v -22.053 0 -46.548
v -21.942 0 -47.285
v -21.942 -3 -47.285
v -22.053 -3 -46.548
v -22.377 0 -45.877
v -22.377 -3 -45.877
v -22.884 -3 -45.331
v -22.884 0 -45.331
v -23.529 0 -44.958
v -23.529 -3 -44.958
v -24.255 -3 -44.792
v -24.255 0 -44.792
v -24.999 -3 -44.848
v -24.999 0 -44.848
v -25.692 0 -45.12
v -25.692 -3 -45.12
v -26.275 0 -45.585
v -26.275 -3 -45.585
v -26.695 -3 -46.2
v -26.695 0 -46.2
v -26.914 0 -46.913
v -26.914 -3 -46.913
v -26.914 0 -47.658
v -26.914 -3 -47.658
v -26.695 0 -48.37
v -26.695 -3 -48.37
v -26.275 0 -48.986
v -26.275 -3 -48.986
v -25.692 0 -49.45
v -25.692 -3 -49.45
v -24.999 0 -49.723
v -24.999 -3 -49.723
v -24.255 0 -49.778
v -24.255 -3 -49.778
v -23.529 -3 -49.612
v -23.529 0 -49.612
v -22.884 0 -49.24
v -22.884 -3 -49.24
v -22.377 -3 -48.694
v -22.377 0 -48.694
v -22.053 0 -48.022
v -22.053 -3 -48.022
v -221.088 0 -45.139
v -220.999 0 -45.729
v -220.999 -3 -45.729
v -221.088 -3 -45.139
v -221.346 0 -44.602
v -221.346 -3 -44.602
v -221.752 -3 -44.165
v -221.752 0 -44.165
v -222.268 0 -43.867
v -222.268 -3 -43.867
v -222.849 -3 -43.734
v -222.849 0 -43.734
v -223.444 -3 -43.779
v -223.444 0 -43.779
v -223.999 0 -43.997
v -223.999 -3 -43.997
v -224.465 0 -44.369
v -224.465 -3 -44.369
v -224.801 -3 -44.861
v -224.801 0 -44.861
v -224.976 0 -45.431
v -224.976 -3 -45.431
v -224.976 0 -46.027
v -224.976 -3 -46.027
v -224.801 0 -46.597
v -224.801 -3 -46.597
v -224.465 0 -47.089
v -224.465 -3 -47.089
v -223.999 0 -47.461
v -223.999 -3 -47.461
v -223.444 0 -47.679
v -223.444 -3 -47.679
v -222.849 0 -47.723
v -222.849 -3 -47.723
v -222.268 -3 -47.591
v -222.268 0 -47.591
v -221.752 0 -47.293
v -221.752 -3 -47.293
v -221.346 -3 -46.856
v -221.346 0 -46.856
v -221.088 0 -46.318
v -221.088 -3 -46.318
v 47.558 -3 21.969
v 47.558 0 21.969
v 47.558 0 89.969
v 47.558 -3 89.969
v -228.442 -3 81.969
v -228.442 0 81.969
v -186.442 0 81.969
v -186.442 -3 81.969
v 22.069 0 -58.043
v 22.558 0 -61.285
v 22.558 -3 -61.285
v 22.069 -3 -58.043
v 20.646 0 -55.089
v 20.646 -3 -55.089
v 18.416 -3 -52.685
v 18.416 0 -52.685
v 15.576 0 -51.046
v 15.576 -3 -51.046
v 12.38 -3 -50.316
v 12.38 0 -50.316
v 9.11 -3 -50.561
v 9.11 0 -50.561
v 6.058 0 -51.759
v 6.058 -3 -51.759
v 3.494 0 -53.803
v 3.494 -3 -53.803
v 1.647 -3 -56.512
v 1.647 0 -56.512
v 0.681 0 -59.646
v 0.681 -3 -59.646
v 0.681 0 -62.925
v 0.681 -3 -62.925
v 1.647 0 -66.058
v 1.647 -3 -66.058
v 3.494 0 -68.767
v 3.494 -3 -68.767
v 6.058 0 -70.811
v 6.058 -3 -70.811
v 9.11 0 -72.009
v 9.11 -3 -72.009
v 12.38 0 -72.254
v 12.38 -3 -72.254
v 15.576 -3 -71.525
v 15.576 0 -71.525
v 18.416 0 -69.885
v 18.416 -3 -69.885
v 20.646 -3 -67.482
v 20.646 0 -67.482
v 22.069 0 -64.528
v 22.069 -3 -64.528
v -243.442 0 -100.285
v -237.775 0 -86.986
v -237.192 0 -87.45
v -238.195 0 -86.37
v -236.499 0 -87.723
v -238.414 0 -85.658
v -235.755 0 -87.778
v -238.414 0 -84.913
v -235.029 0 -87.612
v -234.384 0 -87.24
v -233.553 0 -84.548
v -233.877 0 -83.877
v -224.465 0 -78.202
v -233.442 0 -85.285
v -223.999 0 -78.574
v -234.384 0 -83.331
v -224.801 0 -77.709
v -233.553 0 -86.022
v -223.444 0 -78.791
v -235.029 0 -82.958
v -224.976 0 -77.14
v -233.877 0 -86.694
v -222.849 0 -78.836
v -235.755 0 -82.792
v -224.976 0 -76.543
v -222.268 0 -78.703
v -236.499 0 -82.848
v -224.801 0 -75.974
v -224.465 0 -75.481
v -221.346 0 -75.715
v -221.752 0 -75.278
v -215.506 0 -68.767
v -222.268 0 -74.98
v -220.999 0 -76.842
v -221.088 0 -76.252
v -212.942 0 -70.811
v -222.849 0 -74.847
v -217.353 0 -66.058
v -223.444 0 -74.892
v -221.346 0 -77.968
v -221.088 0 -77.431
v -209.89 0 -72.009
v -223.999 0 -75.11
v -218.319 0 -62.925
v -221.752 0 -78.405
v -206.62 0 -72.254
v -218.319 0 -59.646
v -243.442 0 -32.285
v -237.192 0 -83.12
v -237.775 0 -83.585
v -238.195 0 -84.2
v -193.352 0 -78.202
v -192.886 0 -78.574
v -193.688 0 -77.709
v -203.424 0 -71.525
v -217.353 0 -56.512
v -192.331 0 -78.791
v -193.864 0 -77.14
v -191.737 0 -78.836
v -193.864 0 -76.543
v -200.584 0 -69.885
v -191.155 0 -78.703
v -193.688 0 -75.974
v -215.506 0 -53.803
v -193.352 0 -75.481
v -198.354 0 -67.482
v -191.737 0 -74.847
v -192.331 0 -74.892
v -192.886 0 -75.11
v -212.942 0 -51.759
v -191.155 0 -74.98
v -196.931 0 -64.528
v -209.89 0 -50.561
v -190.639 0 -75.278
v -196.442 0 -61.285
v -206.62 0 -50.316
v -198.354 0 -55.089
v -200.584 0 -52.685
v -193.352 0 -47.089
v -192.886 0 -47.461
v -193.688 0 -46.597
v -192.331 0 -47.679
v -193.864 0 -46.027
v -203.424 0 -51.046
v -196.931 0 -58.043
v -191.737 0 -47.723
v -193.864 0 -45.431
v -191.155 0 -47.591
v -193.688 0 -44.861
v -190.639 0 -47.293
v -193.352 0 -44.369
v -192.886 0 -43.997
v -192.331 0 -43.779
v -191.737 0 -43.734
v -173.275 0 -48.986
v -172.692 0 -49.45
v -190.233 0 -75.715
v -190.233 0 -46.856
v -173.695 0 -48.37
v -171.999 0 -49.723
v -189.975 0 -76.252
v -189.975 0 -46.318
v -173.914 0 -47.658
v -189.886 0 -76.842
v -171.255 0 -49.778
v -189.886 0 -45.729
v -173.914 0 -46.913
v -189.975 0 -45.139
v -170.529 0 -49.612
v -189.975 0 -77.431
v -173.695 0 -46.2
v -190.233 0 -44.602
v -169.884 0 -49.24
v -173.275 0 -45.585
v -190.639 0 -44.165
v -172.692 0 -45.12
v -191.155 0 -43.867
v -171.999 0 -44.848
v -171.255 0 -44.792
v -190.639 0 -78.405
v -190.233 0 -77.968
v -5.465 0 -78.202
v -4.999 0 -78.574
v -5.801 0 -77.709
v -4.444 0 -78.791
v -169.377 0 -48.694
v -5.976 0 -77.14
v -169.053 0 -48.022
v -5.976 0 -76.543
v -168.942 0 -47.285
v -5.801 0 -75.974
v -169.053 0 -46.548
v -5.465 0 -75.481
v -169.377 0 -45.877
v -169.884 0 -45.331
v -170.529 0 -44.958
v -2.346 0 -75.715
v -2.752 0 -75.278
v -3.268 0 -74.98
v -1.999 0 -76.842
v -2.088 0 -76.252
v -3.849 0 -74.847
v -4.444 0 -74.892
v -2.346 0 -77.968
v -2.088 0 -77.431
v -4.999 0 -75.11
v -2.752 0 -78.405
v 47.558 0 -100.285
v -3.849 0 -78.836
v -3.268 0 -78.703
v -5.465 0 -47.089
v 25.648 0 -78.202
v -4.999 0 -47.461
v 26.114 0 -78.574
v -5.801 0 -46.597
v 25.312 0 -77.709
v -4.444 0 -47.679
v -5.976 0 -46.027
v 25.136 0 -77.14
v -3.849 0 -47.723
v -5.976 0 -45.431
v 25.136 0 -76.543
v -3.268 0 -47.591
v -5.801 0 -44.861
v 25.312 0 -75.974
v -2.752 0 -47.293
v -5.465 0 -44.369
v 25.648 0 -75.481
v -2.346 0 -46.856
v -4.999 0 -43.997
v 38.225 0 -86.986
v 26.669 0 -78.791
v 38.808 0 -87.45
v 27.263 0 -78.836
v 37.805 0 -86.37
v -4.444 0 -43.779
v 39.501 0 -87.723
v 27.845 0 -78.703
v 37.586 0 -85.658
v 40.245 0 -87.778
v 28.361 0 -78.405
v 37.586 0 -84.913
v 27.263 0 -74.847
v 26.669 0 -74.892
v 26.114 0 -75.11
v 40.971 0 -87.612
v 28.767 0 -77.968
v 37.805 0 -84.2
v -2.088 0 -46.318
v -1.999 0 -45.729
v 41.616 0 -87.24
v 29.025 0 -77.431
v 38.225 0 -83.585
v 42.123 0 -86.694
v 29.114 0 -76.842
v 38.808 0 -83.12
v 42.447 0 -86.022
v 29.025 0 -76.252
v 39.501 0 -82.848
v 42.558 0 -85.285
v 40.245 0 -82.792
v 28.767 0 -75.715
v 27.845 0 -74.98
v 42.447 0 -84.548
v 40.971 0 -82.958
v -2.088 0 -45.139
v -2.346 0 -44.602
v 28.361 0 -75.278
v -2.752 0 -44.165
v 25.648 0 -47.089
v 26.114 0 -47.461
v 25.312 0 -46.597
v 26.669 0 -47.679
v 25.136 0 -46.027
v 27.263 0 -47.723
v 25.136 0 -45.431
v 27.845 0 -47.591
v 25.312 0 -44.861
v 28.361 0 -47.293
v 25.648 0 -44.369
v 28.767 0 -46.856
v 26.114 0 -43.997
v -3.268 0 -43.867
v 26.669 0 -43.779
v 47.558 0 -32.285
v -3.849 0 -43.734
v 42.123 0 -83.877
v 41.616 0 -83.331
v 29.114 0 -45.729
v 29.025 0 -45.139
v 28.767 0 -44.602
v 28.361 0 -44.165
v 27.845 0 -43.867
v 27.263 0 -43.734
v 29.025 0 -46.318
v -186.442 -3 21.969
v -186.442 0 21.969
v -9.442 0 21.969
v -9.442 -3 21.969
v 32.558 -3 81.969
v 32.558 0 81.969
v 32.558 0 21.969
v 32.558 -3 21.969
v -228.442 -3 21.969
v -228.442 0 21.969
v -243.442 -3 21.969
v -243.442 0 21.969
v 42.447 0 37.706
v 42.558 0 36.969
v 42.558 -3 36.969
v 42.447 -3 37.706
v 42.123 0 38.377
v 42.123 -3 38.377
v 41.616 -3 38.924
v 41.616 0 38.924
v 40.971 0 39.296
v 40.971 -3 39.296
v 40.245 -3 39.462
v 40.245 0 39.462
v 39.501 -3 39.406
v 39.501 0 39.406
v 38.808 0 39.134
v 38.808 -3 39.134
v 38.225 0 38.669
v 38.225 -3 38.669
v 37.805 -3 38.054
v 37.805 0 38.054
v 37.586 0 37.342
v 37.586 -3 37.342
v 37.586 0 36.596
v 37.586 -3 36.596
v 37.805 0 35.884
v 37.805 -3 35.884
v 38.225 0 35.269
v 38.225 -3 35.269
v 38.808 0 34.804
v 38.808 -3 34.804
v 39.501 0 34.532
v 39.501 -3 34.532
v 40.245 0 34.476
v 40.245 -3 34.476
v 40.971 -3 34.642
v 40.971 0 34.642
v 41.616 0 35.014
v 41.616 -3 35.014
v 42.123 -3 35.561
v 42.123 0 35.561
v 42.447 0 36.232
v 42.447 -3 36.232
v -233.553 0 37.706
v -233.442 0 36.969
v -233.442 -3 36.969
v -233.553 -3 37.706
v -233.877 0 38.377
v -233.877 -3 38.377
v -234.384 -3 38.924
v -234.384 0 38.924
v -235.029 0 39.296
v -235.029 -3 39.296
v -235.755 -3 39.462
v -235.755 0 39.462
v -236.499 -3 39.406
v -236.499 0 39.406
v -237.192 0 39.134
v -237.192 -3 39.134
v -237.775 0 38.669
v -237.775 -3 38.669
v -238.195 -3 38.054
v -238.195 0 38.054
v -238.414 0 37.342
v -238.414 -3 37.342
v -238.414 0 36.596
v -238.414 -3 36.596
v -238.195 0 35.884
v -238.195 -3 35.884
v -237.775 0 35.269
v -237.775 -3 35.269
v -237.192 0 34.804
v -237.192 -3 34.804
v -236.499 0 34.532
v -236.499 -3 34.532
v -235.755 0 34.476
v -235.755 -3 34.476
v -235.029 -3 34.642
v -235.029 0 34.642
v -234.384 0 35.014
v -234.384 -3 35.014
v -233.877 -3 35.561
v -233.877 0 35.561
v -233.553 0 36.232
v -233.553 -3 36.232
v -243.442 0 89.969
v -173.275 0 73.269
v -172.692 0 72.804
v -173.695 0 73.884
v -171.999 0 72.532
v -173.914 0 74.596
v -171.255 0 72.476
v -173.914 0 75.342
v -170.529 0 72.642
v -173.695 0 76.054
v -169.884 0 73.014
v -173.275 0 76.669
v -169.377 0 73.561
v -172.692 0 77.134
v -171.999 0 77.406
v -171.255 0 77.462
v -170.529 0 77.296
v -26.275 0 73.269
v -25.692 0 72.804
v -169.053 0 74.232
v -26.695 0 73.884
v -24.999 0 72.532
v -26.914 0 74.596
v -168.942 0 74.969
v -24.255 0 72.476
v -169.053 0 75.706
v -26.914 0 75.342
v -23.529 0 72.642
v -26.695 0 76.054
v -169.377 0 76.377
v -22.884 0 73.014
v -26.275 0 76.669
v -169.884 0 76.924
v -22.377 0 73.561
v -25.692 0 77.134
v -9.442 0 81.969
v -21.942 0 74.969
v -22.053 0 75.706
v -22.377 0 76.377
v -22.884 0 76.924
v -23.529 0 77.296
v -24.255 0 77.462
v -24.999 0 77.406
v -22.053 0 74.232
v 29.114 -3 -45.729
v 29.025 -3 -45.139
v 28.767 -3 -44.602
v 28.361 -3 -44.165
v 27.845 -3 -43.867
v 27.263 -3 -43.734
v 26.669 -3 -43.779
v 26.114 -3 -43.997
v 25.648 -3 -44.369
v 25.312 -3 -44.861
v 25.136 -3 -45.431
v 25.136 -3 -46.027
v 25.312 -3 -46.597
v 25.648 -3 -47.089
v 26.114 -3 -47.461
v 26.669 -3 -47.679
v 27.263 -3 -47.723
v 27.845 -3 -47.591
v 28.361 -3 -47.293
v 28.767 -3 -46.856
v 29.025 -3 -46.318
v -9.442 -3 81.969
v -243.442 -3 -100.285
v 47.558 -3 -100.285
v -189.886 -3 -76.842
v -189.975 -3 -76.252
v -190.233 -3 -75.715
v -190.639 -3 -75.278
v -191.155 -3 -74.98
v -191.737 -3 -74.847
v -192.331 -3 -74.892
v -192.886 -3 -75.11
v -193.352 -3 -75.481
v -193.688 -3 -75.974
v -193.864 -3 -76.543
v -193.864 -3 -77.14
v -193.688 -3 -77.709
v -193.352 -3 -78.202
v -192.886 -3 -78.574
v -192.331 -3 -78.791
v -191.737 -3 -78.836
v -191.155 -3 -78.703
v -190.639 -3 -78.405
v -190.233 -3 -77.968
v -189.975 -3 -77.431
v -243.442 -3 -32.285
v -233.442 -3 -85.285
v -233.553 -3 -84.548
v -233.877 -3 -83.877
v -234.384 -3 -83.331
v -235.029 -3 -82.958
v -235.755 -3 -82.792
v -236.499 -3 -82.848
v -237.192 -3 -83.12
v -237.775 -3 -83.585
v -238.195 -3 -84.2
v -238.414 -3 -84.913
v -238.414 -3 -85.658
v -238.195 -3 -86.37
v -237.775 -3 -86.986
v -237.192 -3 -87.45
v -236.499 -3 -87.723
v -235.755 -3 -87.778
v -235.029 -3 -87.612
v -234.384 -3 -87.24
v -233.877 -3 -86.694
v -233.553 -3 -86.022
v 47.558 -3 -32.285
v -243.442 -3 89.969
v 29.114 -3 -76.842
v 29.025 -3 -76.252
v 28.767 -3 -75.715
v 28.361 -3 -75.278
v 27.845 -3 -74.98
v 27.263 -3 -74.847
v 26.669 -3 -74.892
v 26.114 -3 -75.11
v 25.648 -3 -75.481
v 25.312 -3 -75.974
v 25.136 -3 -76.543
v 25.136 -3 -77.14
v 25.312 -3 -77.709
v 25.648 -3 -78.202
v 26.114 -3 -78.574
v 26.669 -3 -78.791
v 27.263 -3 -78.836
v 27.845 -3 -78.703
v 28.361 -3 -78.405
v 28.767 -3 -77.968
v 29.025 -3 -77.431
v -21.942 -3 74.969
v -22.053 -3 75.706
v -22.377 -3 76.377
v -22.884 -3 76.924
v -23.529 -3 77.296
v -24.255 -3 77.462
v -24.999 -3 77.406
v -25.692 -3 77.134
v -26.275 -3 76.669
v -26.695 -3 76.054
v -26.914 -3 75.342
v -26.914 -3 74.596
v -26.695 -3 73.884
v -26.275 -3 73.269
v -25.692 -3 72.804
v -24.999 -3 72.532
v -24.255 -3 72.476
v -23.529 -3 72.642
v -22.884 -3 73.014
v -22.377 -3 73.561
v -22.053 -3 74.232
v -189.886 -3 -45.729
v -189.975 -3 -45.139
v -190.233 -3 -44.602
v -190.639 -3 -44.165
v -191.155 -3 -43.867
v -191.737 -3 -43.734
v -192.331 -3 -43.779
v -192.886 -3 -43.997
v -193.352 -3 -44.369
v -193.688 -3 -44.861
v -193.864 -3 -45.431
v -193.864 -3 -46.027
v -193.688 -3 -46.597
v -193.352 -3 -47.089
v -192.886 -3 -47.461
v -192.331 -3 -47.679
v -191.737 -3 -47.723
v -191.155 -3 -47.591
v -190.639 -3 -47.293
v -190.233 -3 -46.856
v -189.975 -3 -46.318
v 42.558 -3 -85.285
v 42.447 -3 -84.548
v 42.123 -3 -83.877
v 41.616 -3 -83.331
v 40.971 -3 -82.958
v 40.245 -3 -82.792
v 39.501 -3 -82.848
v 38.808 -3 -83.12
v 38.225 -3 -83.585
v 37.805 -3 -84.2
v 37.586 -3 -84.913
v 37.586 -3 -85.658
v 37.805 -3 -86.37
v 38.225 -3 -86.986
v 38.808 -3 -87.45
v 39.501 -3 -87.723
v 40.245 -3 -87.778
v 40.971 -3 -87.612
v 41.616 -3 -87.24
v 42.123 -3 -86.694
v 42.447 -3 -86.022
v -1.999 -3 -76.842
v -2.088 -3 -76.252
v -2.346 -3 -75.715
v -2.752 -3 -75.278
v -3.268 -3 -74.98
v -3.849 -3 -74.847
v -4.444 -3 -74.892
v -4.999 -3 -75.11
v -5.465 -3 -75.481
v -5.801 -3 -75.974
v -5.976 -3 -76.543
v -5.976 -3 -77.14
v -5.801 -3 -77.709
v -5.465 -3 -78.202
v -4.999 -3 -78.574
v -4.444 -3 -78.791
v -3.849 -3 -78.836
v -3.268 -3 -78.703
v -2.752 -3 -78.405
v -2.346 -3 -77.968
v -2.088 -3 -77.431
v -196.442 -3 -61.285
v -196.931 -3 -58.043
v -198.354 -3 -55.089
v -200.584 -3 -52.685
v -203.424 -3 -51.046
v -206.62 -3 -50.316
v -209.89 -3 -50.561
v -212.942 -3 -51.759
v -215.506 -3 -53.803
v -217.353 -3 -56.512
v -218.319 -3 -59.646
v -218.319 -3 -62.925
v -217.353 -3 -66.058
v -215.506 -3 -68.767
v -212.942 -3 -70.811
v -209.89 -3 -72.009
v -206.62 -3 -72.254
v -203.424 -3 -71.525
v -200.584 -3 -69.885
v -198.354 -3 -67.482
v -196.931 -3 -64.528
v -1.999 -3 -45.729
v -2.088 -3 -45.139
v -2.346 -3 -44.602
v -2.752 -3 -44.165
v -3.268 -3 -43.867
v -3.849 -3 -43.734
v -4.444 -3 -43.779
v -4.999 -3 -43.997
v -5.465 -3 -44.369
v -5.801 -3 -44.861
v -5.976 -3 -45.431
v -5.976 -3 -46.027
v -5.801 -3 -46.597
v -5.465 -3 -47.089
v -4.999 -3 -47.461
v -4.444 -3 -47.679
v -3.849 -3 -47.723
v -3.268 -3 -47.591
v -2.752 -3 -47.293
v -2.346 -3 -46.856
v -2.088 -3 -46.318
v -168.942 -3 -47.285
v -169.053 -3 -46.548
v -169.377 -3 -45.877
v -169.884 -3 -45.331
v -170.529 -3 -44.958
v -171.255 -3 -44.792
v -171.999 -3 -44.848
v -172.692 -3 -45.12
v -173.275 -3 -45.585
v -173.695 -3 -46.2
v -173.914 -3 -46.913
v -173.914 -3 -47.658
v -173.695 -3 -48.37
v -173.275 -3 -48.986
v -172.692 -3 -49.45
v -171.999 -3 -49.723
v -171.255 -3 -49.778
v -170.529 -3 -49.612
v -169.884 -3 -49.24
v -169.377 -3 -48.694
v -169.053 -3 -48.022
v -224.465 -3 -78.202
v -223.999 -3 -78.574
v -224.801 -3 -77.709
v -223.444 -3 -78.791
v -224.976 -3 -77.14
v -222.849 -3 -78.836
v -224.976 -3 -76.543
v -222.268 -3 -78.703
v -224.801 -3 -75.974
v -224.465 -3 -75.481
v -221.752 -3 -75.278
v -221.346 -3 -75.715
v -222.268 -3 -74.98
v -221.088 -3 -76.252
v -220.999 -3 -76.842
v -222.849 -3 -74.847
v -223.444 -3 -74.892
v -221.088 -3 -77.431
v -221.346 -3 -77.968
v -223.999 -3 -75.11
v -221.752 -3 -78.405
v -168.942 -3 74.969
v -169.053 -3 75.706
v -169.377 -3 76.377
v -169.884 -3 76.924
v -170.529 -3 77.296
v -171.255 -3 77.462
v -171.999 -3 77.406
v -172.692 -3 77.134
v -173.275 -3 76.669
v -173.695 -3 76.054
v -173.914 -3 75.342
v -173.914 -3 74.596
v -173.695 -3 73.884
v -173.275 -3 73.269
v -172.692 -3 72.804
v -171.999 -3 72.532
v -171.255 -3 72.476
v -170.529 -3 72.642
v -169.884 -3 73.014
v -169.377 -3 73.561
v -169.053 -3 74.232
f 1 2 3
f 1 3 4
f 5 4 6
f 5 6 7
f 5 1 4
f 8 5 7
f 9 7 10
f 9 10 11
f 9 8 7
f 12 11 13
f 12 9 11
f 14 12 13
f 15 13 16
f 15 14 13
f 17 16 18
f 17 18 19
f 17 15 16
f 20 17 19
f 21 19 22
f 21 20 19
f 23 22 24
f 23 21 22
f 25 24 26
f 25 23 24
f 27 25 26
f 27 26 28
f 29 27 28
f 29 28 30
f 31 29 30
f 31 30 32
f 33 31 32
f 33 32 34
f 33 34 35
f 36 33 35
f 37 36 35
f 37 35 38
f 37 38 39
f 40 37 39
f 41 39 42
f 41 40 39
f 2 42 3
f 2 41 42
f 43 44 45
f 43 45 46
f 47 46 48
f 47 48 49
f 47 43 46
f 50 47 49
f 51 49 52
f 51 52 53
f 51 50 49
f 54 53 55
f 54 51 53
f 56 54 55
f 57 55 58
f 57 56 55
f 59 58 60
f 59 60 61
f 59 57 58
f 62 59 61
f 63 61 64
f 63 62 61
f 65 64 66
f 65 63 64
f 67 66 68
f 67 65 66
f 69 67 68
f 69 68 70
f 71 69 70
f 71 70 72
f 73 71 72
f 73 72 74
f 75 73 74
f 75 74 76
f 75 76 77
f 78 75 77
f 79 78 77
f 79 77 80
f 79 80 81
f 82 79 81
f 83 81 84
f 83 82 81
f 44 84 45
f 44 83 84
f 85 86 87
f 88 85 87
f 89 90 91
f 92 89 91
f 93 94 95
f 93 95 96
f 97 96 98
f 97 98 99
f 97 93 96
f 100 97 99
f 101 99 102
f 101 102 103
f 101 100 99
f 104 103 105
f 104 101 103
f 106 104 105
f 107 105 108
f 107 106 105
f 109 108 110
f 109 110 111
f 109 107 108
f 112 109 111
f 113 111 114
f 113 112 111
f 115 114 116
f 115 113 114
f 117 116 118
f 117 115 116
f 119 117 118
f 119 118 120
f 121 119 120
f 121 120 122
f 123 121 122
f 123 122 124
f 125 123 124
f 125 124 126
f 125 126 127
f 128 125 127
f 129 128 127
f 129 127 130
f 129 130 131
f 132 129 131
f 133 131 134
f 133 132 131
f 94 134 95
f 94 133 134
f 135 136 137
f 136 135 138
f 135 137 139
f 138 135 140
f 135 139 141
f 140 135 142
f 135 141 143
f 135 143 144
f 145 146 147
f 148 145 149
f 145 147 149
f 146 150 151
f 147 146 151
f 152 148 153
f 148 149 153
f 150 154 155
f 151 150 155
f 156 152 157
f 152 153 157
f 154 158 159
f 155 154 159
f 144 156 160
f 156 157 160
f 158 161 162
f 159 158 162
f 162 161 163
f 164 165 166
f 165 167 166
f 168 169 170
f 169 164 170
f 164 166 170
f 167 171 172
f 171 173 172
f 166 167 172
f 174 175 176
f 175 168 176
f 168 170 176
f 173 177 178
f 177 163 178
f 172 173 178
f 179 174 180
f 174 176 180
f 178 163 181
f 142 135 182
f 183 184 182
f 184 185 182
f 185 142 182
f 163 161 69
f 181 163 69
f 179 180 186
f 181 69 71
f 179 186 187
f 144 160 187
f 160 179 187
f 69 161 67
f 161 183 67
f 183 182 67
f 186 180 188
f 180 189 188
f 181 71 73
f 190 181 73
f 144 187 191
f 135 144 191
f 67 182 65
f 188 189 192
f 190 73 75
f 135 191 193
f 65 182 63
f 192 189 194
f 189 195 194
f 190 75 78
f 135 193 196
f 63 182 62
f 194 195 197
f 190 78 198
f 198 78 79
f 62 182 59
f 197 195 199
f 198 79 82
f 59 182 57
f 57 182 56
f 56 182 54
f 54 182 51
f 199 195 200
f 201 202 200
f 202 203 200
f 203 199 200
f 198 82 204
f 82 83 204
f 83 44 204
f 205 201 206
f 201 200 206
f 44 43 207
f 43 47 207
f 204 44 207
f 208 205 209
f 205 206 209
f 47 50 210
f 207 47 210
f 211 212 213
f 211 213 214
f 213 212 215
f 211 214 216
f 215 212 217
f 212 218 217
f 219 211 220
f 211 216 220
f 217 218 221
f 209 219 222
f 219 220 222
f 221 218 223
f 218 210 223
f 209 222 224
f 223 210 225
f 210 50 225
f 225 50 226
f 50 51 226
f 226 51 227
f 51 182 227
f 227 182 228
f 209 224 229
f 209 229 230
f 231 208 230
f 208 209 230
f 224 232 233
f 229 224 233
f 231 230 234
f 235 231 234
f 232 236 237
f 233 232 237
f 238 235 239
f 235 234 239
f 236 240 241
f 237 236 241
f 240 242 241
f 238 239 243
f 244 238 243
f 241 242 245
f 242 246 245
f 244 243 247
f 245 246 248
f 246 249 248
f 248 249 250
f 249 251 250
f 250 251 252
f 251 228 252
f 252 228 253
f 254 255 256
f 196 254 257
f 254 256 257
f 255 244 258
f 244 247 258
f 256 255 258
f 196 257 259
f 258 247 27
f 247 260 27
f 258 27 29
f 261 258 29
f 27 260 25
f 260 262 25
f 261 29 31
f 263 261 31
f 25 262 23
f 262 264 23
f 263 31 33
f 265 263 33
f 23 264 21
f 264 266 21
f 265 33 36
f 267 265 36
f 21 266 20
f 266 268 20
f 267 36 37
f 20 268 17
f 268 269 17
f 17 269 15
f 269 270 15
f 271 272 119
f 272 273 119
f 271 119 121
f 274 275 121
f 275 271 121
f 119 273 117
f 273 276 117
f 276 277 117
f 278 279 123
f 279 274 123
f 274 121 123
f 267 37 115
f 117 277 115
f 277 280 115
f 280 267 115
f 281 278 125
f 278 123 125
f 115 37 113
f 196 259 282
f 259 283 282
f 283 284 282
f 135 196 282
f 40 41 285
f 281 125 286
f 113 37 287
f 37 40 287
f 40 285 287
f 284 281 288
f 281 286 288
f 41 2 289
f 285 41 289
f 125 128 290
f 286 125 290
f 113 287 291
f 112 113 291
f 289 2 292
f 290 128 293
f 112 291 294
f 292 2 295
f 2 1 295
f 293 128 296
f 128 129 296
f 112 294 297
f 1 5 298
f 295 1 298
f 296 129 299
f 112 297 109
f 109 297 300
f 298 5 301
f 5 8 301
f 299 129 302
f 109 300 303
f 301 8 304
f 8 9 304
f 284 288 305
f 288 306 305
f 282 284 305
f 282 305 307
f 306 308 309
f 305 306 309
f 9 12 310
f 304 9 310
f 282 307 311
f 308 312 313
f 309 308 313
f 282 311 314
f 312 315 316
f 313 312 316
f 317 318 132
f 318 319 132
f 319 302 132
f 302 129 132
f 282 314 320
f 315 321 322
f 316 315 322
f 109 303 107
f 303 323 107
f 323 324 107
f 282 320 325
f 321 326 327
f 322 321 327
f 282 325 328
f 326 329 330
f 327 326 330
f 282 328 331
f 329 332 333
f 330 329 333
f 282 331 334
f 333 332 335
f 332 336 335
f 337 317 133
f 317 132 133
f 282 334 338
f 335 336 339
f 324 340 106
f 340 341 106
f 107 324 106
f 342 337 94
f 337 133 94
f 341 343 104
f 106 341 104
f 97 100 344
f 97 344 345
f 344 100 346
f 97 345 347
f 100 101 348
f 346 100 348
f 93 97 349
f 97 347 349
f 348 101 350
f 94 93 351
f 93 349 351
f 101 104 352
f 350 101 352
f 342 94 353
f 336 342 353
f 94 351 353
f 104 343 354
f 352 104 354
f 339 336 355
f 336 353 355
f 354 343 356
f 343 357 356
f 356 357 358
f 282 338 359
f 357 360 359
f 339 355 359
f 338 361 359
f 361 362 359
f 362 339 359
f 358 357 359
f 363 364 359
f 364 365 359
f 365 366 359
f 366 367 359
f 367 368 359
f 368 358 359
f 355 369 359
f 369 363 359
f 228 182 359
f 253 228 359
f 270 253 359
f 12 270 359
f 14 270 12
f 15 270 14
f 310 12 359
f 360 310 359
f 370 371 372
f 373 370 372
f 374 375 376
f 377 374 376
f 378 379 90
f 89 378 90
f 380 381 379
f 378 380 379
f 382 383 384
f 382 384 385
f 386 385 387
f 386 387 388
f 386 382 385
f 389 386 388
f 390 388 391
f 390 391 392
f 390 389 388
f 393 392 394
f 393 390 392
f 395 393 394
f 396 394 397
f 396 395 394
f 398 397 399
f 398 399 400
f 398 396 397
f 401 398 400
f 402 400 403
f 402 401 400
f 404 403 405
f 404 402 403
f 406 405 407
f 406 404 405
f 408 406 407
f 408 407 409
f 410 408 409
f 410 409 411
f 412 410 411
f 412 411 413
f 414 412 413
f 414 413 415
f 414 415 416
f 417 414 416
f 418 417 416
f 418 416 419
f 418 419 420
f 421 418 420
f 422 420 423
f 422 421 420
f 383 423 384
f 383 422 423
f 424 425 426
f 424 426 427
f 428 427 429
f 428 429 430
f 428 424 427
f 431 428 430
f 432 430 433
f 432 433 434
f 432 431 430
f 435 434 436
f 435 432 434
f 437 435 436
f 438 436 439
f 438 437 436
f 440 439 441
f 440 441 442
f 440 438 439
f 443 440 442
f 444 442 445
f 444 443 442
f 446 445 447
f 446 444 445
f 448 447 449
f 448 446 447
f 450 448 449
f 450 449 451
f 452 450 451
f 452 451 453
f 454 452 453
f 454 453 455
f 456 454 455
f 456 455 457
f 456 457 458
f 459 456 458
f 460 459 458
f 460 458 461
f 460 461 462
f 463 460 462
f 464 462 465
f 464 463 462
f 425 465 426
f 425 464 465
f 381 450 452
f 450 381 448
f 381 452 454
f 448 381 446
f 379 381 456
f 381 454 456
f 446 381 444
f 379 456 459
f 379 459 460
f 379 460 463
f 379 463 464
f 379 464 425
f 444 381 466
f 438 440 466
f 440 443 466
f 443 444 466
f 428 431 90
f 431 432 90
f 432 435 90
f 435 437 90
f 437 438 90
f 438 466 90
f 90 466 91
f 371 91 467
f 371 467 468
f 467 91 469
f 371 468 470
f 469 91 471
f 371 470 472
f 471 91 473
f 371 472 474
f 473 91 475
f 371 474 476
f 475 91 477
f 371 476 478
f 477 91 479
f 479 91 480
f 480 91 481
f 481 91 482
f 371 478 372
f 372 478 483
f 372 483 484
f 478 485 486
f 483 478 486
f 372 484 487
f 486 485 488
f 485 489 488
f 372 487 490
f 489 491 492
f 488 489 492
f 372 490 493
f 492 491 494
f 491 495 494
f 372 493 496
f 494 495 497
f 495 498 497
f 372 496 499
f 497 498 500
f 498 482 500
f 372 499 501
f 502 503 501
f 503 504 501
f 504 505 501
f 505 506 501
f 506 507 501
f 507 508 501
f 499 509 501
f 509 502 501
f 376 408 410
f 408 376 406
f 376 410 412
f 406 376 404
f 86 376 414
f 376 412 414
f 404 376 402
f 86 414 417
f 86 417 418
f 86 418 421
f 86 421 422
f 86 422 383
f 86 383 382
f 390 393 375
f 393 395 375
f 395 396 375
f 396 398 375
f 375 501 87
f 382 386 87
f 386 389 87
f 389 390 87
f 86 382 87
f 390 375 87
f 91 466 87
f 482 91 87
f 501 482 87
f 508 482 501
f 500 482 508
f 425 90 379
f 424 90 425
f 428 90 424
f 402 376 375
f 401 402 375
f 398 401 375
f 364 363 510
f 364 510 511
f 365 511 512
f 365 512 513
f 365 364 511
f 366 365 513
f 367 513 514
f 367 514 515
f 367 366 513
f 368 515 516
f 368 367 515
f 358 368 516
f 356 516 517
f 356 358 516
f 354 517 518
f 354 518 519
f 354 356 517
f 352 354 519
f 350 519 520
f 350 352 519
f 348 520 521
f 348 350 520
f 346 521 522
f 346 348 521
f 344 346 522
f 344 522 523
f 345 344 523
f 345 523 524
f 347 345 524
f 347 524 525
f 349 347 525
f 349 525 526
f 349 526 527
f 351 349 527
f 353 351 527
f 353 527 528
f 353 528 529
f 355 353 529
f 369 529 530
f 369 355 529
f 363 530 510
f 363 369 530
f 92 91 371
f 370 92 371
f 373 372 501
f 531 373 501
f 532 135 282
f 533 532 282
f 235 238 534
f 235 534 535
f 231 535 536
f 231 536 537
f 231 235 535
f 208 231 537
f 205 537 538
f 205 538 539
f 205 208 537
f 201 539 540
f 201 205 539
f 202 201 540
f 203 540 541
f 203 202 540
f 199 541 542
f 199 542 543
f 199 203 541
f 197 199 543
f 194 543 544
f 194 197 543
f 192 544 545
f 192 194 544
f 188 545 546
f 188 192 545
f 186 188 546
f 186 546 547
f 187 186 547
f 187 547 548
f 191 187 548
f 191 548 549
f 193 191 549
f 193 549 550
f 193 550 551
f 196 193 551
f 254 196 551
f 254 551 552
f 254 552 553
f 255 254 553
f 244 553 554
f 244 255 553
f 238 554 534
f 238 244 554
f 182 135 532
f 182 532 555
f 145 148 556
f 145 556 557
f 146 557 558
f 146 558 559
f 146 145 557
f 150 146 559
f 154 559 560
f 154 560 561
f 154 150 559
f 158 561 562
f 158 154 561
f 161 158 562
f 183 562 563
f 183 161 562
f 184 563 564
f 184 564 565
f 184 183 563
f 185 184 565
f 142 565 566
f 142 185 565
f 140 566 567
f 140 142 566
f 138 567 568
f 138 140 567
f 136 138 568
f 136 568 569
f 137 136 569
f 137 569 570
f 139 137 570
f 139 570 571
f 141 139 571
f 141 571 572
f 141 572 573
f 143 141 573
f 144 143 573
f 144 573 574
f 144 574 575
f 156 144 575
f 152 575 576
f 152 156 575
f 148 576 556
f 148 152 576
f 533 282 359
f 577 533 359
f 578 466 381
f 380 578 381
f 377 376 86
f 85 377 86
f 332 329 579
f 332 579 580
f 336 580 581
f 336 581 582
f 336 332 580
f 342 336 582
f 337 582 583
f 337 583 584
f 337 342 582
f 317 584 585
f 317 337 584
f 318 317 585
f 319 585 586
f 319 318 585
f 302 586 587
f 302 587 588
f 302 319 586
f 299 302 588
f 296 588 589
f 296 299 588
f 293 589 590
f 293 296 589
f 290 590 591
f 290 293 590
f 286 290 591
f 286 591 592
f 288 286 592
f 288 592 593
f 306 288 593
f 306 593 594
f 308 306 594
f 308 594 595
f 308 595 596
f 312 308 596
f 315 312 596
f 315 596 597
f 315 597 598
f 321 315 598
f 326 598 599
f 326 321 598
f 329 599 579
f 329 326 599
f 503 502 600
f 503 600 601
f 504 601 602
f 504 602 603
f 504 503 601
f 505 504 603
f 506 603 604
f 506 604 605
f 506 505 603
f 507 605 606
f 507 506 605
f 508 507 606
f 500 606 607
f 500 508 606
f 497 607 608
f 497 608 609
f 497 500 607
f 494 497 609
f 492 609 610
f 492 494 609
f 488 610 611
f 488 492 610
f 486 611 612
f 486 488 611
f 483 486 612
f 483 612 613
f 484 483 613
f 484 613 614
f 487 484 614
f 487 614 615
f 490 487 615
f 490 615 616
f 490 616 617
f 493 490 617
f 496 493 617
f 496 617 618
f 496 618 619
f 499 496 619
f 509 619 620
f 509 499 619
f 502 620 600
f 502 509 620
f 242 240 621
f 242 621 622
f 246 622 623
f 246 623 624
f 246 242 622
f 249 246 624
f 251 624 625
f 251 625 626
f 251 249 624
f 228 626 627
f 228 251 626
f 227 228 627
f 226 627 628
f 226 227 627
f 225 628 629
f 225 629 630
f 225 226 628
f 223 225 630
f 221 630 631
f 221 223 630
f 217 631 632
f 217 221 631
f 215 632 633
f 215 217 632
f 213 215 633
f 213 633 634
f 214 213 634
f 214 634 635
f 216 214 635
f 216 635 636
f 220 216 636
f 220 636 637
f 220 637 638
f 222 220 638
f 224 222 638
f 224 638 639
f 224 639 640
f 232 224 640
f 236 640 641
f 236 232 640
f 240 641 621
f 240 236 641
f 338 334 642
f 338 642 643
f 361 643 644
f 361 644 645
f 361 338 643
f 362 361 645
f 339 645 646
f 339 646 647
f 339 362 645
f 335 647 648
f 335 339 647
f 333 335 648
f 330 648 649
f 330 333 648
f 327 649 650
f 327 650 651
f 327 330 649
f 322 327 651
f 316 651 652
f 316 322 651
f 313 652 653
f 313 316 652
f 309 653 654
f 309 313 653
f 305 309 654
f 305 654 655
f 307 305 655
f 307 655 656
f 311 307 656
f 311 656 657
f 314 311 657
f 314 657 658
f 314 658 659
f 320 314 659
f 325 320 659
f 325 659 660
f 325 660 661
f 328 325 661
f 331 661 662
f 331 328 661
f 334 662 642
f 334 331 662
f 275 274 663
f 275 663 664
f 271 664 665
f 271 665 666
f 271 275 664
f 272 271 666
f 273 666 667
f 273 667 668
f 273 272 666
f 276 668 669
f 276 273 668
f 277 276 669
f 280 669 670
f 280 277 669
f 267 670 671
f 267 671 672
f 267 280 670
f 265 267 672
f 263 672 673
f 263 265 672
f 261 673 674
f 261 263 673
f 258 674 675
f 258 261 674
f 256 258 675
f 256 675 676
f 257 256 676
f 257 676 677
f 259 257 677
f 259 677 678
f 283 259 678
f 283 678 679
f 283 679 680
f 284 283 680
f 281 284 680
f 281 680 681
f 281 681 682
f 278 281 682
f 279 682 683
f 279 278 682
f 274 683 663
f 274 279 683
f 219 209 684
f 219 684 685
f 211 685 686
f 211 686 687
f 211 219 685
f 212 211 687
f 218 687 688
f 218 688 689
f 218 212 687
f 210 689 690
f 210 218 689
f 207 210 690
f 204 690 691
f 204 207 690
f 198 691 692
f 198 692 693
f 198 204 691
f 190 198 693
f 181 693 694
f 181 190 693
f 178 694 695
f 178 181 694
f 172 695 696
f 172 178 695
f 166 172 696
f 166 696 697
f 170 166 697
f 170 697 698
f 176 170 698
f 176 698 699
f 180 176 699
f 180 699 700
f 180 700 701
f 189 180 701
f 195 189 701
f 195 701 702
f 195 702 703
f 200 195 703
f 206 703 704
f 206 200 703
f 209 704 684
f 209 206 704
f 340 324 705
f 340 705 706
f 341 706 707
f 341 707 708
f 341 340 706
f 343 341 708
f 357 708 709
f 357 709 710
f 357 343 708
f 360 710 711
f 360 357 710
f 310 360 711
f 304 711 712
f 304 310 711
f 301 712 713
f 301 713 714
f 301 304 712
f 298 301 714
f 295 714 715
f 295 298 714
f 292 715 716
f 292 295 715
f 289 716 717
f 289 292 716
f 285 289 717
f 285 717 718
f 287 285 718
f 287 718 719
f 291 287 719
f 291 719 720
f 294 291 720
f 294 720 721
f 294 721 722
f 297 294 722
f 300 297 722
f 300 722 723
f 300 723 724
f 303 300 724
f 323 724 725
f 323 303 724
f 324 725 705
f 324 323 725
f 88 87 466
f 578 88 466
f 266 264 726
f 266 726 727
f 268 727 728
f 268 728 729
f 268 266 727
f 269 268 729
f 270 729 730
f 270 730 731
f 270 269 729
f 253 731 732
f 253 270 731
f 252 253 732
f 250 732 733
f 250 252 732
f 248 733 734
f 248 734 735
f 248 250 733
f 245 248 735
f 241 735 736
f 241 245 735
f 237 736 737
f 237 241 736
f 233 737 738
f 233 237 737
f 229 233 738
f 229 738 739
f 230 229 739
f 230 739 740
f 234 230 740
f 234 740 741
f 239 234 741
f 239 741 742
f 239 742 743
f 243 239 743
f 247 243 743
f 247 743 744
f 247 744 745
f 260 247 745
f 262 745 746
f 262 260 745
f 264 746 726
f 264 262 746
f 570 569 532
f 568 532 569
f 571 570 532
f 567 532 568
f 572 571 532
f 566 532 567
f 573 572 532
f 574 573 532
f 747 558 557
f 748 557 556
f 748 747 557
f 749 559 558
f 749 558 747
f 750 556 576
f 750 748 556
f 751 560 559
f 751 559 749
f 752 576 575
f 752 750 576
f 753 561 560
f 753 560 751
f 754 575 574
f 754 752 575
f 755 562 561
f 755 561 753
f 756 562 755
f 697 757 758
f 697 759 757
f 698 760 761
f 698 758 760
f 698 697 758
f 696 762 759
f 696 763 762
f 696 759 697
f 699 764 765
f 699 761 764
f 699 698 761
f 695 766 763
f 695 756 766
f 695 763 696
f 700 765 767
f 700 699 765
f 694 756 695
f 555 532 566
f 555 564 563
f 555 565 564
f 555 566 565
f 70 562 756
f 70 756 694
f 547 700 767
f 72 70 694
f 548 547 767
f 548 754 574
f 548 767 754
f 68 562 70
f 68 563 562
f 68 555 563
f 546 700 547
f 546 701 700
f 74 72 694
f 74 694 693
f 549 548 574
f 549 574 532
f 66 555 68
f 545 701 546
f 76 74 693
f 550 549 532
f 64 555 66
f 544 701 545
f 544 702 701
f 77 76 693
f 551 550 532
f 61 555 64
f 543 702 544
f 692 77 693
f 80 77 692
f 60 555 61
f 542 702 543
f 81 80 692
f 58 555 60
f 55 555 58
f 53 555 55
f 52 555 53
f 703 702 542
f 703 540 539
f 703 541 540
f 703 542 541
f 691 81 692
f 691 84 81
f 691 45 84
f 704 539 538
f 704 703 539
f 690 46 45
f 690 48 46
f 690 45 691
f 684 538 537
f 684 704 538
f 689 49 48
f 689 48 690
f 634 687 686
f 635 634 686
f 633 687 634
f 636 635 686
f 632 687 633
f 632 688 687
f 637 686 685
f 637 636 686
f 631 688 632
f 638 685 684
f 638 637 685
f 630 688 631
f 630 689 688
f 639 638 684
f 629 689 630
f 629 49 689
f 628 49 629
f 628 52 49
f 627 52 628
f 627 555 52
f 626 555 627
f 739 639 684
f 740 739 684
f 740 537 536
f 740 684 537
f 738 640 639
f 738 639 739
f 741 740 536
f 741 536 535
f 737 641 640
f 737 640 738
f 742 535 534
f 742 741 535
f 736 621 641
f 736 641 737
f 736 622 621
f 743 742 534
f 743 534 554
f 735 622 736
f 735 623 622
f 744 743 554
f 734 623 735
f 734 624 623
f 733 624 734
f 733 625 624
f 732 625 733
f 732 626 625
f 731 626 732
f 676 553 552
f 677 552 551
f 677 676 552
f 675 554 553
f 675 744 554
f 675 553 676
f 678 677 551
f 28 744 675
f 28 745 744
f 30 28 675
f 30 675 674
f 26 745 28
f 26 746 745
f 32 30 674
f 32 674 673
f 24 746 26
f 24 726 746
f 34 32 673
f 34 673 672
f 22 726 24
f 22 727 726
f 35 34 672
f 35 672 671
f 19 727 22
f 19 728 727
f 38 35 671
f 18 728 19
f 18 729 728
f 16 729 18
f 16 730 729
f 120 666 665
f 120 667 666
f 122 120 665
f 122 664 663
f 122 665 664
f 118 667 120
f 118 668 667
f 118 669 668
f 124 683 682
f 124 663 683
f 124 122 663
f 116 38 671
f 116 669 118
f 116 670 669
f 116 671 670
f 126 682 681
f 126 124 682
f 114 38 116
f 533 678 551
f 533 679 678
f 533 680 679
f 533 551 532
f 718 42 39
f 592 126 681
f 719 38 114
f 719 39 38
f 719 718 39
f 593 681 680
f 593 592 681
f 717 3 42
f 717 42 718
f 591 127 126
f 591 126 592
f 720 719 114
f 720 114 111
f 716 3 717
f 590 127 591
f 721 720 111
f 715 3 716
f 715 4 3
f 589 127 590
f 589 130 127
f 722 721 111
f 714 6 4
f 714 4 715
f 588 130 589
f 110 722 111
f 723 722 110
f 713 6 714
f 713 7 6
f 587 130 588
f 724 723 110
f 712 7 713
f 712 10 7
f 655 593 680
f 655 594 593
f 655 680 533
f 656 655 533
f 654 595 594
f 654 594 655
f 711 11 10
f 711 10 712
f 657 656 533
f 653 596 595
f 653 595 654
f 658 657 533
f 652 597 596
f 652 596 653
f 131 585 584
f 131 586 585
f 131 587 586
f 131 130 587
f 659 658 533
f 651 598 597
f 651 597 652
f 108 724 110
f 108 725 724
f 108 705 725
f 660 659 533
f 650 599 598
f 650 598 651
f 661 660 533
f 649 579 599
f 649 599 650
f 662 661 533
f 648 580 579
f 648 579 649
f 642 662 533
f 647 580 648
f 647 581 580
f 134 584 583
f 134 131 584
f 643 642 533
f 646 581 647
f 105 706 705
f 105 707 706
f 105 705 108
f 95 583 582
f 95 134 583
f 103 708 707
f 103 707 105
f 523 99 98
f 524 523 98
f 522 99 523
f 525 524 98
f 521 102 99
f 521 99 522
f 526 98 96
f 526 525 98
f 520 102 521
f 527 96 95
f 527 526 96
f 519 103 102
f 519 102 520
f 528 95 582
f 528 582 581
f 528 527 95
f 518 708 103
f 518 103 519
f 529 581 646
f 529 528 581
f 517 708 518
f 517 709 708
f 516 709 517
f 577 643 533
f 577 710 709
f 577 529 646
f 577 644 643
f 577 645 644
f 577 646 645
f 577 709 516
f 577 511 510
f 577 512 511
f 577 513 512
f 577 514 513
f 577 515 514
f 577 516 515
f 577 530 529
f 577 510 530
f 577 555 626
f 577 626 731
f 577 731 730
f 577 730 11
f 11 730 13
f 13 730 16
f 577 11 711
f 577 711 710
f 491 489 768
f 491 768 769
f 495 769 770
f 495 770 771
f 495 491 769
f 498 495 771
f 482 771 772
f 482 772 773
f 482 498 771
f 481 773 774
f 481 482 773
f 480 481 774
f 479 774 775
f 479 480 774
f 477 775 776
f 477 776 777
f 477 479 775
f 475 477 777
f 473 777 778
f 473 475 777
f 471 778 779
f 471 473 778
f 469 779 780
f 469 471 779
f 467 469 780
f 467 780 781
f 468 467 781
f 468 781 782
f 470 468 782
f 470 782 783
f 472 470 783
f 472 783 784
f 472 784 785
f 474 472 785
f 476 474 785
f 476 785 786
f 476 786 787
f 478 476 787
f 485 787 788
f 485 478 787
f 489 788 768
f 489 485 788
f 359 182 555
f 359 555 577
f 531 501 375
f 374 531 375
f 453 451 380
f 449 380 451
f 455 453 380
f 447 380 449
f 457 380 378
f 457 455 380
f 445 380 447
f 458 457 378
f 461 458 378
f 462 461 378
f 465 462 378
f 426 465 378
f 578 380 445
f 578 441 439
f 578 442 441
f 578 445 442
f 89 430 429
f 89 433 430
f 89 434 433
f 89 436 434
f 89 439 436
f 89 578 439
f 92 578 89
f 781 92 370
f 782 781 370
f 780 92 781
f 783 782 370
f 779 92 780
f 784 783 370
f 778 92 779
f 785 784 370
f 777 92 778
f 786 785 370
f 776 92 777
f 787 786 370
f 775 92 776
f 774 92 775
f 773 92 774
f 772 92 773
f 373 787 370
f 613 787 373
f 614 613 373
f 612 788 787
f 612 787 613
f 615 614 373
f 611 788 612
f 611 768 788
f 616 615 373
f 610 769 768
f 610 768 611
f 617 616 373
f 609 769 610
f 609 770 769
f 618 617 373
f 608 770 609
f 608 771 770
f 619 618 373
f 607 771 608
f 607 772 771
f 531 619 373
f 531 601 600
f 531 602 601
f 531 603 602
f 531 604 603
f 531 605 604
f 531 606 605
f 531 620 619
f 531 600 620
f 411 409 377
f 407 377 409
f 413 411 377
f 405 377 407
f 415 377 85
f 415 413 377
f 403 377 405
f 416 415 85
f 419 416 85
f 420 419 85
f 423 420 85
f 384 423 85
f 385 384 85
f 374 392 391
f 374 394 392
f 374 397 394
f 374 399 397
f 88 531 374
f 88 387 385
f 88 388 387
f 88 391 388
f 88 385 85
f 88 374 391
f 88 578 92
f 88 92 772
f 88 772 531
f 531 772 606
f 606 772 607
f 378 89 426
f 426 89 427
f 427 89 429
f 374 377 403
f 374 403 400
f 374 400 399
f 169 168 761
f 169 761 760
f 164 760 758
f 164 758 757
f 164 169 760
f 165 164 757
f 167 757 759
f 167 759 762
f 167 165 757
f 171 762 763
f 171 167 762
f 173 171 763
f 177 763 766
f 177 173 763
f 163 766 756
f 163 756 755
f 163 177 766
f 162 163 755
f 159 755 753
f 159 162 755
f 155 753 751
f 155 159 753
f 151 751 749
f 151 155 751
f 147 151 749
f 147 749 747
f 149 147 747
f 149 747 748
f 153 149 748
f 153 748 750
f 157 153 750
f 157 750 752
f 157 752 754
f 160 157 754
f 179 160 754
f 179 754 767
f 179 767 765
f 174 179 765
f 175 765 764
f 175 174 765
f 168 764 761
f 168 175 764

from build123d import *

# Parameters (mm, degrees)
F0_R     = 2.5
F0_W     = 291
F0_H     = 68
F0_R_2   = 2
F0_R_3   = 11
F1_DEPTH = 3


with BuildPart() as f1:
    # F0 (on Front) → F1 (new body)
    with BuildSketch(Plane.XZ):
        Polygon((47.557675, 89.969031), (-243.442325, 89.969031), (-243.442325, 21.969031), (-228.442325, 21.969031), (-228.442325, 81.969031), (-186.442325, 81.969031), (-186.442325, 21.969031), (-9.442325, 21.969031), (-9.442325, 81.969031), (32.557675, 81.969031), (32.557675, 21.969031), (47.557675, 21.969031), align=None)
        with Locations((-235.942325, 36.969031)):
            Circle(F0_R, mode=Mode.SUBTRACT)
        with Locations((-171.442325, 74.969031)):
            Circle(F0_R, mode=Mode.SUBTRACT)
        with Locations((40.057675, 36.969031)):
            Circle(F0_R, mode=Mode.SUBTRACT)
        with Locations((-24.442325, 74.969031)):
            Circle(F0_R, mode=Mode.SUBTRACT)
        with Locations((-97.942325, -66.285209)):
            Rectangle(F0_W, F0_H)
        with Locations((-235.942325, -85.285209)):
            Circle(F0_R, mode=Mode.SUBTRACT)
        with Locations((-222.998675, -76.841558)):
            Circle(F0_R_2, mode=Mode.SUBTRACT)
        with Locations((-191.885976, -76.841558)):
            Circle(F0_R_2, mode=Mode.SUBTRACT)
        with Locations((-207.442325, -61.285209)):
            Circle(F0_R_3, mode=Mode.SUBTRACT)
        with Locations((-222.998675, -45.72886)):
            Circle(F0_R_2, mode=Mode.SUBTRACT)
        with Locations((-191.885976, -45.72886)):
            Circle(F0_R_2, mode=Mode.SUBTRACT)
        with Locations((-171.442325, -47.285209)):
            Circle(F0_R, mode=Mode.SUBTRACT)
        with Locations((-3.998675, -76.841558)):
            Circle(F0_R_2, mode=Mode.SUBTRACT)
        with Locations((27.114024, -76.841558)):
            Circle(F0_R_2, mode=Mode.SUBTRACT)
        with Locations((40.057675, -85.285209)):
            Circle(F0_R, mode=Mode.SUBTRACT)
        with Locations((11.557675, -61.285209)):
            Circle(F0_R_3, mode=Mode.SUBTRACT)
        with Locations((-24.442325, -47.285209)):
            Circle(F0_R, mode=Mode.SUBTRACT)
        with Locations((-3.998675, -45.72886)):
            Circle(F0_R_2, mode=Mode.SUBTRACT)
        with Locations((27.114024, -45.72886)):
            Circle(F0_R_2, mode=Mode.SUBTRACT)
    extrude(amount=F1_DEPTH)


solid = f1.part
